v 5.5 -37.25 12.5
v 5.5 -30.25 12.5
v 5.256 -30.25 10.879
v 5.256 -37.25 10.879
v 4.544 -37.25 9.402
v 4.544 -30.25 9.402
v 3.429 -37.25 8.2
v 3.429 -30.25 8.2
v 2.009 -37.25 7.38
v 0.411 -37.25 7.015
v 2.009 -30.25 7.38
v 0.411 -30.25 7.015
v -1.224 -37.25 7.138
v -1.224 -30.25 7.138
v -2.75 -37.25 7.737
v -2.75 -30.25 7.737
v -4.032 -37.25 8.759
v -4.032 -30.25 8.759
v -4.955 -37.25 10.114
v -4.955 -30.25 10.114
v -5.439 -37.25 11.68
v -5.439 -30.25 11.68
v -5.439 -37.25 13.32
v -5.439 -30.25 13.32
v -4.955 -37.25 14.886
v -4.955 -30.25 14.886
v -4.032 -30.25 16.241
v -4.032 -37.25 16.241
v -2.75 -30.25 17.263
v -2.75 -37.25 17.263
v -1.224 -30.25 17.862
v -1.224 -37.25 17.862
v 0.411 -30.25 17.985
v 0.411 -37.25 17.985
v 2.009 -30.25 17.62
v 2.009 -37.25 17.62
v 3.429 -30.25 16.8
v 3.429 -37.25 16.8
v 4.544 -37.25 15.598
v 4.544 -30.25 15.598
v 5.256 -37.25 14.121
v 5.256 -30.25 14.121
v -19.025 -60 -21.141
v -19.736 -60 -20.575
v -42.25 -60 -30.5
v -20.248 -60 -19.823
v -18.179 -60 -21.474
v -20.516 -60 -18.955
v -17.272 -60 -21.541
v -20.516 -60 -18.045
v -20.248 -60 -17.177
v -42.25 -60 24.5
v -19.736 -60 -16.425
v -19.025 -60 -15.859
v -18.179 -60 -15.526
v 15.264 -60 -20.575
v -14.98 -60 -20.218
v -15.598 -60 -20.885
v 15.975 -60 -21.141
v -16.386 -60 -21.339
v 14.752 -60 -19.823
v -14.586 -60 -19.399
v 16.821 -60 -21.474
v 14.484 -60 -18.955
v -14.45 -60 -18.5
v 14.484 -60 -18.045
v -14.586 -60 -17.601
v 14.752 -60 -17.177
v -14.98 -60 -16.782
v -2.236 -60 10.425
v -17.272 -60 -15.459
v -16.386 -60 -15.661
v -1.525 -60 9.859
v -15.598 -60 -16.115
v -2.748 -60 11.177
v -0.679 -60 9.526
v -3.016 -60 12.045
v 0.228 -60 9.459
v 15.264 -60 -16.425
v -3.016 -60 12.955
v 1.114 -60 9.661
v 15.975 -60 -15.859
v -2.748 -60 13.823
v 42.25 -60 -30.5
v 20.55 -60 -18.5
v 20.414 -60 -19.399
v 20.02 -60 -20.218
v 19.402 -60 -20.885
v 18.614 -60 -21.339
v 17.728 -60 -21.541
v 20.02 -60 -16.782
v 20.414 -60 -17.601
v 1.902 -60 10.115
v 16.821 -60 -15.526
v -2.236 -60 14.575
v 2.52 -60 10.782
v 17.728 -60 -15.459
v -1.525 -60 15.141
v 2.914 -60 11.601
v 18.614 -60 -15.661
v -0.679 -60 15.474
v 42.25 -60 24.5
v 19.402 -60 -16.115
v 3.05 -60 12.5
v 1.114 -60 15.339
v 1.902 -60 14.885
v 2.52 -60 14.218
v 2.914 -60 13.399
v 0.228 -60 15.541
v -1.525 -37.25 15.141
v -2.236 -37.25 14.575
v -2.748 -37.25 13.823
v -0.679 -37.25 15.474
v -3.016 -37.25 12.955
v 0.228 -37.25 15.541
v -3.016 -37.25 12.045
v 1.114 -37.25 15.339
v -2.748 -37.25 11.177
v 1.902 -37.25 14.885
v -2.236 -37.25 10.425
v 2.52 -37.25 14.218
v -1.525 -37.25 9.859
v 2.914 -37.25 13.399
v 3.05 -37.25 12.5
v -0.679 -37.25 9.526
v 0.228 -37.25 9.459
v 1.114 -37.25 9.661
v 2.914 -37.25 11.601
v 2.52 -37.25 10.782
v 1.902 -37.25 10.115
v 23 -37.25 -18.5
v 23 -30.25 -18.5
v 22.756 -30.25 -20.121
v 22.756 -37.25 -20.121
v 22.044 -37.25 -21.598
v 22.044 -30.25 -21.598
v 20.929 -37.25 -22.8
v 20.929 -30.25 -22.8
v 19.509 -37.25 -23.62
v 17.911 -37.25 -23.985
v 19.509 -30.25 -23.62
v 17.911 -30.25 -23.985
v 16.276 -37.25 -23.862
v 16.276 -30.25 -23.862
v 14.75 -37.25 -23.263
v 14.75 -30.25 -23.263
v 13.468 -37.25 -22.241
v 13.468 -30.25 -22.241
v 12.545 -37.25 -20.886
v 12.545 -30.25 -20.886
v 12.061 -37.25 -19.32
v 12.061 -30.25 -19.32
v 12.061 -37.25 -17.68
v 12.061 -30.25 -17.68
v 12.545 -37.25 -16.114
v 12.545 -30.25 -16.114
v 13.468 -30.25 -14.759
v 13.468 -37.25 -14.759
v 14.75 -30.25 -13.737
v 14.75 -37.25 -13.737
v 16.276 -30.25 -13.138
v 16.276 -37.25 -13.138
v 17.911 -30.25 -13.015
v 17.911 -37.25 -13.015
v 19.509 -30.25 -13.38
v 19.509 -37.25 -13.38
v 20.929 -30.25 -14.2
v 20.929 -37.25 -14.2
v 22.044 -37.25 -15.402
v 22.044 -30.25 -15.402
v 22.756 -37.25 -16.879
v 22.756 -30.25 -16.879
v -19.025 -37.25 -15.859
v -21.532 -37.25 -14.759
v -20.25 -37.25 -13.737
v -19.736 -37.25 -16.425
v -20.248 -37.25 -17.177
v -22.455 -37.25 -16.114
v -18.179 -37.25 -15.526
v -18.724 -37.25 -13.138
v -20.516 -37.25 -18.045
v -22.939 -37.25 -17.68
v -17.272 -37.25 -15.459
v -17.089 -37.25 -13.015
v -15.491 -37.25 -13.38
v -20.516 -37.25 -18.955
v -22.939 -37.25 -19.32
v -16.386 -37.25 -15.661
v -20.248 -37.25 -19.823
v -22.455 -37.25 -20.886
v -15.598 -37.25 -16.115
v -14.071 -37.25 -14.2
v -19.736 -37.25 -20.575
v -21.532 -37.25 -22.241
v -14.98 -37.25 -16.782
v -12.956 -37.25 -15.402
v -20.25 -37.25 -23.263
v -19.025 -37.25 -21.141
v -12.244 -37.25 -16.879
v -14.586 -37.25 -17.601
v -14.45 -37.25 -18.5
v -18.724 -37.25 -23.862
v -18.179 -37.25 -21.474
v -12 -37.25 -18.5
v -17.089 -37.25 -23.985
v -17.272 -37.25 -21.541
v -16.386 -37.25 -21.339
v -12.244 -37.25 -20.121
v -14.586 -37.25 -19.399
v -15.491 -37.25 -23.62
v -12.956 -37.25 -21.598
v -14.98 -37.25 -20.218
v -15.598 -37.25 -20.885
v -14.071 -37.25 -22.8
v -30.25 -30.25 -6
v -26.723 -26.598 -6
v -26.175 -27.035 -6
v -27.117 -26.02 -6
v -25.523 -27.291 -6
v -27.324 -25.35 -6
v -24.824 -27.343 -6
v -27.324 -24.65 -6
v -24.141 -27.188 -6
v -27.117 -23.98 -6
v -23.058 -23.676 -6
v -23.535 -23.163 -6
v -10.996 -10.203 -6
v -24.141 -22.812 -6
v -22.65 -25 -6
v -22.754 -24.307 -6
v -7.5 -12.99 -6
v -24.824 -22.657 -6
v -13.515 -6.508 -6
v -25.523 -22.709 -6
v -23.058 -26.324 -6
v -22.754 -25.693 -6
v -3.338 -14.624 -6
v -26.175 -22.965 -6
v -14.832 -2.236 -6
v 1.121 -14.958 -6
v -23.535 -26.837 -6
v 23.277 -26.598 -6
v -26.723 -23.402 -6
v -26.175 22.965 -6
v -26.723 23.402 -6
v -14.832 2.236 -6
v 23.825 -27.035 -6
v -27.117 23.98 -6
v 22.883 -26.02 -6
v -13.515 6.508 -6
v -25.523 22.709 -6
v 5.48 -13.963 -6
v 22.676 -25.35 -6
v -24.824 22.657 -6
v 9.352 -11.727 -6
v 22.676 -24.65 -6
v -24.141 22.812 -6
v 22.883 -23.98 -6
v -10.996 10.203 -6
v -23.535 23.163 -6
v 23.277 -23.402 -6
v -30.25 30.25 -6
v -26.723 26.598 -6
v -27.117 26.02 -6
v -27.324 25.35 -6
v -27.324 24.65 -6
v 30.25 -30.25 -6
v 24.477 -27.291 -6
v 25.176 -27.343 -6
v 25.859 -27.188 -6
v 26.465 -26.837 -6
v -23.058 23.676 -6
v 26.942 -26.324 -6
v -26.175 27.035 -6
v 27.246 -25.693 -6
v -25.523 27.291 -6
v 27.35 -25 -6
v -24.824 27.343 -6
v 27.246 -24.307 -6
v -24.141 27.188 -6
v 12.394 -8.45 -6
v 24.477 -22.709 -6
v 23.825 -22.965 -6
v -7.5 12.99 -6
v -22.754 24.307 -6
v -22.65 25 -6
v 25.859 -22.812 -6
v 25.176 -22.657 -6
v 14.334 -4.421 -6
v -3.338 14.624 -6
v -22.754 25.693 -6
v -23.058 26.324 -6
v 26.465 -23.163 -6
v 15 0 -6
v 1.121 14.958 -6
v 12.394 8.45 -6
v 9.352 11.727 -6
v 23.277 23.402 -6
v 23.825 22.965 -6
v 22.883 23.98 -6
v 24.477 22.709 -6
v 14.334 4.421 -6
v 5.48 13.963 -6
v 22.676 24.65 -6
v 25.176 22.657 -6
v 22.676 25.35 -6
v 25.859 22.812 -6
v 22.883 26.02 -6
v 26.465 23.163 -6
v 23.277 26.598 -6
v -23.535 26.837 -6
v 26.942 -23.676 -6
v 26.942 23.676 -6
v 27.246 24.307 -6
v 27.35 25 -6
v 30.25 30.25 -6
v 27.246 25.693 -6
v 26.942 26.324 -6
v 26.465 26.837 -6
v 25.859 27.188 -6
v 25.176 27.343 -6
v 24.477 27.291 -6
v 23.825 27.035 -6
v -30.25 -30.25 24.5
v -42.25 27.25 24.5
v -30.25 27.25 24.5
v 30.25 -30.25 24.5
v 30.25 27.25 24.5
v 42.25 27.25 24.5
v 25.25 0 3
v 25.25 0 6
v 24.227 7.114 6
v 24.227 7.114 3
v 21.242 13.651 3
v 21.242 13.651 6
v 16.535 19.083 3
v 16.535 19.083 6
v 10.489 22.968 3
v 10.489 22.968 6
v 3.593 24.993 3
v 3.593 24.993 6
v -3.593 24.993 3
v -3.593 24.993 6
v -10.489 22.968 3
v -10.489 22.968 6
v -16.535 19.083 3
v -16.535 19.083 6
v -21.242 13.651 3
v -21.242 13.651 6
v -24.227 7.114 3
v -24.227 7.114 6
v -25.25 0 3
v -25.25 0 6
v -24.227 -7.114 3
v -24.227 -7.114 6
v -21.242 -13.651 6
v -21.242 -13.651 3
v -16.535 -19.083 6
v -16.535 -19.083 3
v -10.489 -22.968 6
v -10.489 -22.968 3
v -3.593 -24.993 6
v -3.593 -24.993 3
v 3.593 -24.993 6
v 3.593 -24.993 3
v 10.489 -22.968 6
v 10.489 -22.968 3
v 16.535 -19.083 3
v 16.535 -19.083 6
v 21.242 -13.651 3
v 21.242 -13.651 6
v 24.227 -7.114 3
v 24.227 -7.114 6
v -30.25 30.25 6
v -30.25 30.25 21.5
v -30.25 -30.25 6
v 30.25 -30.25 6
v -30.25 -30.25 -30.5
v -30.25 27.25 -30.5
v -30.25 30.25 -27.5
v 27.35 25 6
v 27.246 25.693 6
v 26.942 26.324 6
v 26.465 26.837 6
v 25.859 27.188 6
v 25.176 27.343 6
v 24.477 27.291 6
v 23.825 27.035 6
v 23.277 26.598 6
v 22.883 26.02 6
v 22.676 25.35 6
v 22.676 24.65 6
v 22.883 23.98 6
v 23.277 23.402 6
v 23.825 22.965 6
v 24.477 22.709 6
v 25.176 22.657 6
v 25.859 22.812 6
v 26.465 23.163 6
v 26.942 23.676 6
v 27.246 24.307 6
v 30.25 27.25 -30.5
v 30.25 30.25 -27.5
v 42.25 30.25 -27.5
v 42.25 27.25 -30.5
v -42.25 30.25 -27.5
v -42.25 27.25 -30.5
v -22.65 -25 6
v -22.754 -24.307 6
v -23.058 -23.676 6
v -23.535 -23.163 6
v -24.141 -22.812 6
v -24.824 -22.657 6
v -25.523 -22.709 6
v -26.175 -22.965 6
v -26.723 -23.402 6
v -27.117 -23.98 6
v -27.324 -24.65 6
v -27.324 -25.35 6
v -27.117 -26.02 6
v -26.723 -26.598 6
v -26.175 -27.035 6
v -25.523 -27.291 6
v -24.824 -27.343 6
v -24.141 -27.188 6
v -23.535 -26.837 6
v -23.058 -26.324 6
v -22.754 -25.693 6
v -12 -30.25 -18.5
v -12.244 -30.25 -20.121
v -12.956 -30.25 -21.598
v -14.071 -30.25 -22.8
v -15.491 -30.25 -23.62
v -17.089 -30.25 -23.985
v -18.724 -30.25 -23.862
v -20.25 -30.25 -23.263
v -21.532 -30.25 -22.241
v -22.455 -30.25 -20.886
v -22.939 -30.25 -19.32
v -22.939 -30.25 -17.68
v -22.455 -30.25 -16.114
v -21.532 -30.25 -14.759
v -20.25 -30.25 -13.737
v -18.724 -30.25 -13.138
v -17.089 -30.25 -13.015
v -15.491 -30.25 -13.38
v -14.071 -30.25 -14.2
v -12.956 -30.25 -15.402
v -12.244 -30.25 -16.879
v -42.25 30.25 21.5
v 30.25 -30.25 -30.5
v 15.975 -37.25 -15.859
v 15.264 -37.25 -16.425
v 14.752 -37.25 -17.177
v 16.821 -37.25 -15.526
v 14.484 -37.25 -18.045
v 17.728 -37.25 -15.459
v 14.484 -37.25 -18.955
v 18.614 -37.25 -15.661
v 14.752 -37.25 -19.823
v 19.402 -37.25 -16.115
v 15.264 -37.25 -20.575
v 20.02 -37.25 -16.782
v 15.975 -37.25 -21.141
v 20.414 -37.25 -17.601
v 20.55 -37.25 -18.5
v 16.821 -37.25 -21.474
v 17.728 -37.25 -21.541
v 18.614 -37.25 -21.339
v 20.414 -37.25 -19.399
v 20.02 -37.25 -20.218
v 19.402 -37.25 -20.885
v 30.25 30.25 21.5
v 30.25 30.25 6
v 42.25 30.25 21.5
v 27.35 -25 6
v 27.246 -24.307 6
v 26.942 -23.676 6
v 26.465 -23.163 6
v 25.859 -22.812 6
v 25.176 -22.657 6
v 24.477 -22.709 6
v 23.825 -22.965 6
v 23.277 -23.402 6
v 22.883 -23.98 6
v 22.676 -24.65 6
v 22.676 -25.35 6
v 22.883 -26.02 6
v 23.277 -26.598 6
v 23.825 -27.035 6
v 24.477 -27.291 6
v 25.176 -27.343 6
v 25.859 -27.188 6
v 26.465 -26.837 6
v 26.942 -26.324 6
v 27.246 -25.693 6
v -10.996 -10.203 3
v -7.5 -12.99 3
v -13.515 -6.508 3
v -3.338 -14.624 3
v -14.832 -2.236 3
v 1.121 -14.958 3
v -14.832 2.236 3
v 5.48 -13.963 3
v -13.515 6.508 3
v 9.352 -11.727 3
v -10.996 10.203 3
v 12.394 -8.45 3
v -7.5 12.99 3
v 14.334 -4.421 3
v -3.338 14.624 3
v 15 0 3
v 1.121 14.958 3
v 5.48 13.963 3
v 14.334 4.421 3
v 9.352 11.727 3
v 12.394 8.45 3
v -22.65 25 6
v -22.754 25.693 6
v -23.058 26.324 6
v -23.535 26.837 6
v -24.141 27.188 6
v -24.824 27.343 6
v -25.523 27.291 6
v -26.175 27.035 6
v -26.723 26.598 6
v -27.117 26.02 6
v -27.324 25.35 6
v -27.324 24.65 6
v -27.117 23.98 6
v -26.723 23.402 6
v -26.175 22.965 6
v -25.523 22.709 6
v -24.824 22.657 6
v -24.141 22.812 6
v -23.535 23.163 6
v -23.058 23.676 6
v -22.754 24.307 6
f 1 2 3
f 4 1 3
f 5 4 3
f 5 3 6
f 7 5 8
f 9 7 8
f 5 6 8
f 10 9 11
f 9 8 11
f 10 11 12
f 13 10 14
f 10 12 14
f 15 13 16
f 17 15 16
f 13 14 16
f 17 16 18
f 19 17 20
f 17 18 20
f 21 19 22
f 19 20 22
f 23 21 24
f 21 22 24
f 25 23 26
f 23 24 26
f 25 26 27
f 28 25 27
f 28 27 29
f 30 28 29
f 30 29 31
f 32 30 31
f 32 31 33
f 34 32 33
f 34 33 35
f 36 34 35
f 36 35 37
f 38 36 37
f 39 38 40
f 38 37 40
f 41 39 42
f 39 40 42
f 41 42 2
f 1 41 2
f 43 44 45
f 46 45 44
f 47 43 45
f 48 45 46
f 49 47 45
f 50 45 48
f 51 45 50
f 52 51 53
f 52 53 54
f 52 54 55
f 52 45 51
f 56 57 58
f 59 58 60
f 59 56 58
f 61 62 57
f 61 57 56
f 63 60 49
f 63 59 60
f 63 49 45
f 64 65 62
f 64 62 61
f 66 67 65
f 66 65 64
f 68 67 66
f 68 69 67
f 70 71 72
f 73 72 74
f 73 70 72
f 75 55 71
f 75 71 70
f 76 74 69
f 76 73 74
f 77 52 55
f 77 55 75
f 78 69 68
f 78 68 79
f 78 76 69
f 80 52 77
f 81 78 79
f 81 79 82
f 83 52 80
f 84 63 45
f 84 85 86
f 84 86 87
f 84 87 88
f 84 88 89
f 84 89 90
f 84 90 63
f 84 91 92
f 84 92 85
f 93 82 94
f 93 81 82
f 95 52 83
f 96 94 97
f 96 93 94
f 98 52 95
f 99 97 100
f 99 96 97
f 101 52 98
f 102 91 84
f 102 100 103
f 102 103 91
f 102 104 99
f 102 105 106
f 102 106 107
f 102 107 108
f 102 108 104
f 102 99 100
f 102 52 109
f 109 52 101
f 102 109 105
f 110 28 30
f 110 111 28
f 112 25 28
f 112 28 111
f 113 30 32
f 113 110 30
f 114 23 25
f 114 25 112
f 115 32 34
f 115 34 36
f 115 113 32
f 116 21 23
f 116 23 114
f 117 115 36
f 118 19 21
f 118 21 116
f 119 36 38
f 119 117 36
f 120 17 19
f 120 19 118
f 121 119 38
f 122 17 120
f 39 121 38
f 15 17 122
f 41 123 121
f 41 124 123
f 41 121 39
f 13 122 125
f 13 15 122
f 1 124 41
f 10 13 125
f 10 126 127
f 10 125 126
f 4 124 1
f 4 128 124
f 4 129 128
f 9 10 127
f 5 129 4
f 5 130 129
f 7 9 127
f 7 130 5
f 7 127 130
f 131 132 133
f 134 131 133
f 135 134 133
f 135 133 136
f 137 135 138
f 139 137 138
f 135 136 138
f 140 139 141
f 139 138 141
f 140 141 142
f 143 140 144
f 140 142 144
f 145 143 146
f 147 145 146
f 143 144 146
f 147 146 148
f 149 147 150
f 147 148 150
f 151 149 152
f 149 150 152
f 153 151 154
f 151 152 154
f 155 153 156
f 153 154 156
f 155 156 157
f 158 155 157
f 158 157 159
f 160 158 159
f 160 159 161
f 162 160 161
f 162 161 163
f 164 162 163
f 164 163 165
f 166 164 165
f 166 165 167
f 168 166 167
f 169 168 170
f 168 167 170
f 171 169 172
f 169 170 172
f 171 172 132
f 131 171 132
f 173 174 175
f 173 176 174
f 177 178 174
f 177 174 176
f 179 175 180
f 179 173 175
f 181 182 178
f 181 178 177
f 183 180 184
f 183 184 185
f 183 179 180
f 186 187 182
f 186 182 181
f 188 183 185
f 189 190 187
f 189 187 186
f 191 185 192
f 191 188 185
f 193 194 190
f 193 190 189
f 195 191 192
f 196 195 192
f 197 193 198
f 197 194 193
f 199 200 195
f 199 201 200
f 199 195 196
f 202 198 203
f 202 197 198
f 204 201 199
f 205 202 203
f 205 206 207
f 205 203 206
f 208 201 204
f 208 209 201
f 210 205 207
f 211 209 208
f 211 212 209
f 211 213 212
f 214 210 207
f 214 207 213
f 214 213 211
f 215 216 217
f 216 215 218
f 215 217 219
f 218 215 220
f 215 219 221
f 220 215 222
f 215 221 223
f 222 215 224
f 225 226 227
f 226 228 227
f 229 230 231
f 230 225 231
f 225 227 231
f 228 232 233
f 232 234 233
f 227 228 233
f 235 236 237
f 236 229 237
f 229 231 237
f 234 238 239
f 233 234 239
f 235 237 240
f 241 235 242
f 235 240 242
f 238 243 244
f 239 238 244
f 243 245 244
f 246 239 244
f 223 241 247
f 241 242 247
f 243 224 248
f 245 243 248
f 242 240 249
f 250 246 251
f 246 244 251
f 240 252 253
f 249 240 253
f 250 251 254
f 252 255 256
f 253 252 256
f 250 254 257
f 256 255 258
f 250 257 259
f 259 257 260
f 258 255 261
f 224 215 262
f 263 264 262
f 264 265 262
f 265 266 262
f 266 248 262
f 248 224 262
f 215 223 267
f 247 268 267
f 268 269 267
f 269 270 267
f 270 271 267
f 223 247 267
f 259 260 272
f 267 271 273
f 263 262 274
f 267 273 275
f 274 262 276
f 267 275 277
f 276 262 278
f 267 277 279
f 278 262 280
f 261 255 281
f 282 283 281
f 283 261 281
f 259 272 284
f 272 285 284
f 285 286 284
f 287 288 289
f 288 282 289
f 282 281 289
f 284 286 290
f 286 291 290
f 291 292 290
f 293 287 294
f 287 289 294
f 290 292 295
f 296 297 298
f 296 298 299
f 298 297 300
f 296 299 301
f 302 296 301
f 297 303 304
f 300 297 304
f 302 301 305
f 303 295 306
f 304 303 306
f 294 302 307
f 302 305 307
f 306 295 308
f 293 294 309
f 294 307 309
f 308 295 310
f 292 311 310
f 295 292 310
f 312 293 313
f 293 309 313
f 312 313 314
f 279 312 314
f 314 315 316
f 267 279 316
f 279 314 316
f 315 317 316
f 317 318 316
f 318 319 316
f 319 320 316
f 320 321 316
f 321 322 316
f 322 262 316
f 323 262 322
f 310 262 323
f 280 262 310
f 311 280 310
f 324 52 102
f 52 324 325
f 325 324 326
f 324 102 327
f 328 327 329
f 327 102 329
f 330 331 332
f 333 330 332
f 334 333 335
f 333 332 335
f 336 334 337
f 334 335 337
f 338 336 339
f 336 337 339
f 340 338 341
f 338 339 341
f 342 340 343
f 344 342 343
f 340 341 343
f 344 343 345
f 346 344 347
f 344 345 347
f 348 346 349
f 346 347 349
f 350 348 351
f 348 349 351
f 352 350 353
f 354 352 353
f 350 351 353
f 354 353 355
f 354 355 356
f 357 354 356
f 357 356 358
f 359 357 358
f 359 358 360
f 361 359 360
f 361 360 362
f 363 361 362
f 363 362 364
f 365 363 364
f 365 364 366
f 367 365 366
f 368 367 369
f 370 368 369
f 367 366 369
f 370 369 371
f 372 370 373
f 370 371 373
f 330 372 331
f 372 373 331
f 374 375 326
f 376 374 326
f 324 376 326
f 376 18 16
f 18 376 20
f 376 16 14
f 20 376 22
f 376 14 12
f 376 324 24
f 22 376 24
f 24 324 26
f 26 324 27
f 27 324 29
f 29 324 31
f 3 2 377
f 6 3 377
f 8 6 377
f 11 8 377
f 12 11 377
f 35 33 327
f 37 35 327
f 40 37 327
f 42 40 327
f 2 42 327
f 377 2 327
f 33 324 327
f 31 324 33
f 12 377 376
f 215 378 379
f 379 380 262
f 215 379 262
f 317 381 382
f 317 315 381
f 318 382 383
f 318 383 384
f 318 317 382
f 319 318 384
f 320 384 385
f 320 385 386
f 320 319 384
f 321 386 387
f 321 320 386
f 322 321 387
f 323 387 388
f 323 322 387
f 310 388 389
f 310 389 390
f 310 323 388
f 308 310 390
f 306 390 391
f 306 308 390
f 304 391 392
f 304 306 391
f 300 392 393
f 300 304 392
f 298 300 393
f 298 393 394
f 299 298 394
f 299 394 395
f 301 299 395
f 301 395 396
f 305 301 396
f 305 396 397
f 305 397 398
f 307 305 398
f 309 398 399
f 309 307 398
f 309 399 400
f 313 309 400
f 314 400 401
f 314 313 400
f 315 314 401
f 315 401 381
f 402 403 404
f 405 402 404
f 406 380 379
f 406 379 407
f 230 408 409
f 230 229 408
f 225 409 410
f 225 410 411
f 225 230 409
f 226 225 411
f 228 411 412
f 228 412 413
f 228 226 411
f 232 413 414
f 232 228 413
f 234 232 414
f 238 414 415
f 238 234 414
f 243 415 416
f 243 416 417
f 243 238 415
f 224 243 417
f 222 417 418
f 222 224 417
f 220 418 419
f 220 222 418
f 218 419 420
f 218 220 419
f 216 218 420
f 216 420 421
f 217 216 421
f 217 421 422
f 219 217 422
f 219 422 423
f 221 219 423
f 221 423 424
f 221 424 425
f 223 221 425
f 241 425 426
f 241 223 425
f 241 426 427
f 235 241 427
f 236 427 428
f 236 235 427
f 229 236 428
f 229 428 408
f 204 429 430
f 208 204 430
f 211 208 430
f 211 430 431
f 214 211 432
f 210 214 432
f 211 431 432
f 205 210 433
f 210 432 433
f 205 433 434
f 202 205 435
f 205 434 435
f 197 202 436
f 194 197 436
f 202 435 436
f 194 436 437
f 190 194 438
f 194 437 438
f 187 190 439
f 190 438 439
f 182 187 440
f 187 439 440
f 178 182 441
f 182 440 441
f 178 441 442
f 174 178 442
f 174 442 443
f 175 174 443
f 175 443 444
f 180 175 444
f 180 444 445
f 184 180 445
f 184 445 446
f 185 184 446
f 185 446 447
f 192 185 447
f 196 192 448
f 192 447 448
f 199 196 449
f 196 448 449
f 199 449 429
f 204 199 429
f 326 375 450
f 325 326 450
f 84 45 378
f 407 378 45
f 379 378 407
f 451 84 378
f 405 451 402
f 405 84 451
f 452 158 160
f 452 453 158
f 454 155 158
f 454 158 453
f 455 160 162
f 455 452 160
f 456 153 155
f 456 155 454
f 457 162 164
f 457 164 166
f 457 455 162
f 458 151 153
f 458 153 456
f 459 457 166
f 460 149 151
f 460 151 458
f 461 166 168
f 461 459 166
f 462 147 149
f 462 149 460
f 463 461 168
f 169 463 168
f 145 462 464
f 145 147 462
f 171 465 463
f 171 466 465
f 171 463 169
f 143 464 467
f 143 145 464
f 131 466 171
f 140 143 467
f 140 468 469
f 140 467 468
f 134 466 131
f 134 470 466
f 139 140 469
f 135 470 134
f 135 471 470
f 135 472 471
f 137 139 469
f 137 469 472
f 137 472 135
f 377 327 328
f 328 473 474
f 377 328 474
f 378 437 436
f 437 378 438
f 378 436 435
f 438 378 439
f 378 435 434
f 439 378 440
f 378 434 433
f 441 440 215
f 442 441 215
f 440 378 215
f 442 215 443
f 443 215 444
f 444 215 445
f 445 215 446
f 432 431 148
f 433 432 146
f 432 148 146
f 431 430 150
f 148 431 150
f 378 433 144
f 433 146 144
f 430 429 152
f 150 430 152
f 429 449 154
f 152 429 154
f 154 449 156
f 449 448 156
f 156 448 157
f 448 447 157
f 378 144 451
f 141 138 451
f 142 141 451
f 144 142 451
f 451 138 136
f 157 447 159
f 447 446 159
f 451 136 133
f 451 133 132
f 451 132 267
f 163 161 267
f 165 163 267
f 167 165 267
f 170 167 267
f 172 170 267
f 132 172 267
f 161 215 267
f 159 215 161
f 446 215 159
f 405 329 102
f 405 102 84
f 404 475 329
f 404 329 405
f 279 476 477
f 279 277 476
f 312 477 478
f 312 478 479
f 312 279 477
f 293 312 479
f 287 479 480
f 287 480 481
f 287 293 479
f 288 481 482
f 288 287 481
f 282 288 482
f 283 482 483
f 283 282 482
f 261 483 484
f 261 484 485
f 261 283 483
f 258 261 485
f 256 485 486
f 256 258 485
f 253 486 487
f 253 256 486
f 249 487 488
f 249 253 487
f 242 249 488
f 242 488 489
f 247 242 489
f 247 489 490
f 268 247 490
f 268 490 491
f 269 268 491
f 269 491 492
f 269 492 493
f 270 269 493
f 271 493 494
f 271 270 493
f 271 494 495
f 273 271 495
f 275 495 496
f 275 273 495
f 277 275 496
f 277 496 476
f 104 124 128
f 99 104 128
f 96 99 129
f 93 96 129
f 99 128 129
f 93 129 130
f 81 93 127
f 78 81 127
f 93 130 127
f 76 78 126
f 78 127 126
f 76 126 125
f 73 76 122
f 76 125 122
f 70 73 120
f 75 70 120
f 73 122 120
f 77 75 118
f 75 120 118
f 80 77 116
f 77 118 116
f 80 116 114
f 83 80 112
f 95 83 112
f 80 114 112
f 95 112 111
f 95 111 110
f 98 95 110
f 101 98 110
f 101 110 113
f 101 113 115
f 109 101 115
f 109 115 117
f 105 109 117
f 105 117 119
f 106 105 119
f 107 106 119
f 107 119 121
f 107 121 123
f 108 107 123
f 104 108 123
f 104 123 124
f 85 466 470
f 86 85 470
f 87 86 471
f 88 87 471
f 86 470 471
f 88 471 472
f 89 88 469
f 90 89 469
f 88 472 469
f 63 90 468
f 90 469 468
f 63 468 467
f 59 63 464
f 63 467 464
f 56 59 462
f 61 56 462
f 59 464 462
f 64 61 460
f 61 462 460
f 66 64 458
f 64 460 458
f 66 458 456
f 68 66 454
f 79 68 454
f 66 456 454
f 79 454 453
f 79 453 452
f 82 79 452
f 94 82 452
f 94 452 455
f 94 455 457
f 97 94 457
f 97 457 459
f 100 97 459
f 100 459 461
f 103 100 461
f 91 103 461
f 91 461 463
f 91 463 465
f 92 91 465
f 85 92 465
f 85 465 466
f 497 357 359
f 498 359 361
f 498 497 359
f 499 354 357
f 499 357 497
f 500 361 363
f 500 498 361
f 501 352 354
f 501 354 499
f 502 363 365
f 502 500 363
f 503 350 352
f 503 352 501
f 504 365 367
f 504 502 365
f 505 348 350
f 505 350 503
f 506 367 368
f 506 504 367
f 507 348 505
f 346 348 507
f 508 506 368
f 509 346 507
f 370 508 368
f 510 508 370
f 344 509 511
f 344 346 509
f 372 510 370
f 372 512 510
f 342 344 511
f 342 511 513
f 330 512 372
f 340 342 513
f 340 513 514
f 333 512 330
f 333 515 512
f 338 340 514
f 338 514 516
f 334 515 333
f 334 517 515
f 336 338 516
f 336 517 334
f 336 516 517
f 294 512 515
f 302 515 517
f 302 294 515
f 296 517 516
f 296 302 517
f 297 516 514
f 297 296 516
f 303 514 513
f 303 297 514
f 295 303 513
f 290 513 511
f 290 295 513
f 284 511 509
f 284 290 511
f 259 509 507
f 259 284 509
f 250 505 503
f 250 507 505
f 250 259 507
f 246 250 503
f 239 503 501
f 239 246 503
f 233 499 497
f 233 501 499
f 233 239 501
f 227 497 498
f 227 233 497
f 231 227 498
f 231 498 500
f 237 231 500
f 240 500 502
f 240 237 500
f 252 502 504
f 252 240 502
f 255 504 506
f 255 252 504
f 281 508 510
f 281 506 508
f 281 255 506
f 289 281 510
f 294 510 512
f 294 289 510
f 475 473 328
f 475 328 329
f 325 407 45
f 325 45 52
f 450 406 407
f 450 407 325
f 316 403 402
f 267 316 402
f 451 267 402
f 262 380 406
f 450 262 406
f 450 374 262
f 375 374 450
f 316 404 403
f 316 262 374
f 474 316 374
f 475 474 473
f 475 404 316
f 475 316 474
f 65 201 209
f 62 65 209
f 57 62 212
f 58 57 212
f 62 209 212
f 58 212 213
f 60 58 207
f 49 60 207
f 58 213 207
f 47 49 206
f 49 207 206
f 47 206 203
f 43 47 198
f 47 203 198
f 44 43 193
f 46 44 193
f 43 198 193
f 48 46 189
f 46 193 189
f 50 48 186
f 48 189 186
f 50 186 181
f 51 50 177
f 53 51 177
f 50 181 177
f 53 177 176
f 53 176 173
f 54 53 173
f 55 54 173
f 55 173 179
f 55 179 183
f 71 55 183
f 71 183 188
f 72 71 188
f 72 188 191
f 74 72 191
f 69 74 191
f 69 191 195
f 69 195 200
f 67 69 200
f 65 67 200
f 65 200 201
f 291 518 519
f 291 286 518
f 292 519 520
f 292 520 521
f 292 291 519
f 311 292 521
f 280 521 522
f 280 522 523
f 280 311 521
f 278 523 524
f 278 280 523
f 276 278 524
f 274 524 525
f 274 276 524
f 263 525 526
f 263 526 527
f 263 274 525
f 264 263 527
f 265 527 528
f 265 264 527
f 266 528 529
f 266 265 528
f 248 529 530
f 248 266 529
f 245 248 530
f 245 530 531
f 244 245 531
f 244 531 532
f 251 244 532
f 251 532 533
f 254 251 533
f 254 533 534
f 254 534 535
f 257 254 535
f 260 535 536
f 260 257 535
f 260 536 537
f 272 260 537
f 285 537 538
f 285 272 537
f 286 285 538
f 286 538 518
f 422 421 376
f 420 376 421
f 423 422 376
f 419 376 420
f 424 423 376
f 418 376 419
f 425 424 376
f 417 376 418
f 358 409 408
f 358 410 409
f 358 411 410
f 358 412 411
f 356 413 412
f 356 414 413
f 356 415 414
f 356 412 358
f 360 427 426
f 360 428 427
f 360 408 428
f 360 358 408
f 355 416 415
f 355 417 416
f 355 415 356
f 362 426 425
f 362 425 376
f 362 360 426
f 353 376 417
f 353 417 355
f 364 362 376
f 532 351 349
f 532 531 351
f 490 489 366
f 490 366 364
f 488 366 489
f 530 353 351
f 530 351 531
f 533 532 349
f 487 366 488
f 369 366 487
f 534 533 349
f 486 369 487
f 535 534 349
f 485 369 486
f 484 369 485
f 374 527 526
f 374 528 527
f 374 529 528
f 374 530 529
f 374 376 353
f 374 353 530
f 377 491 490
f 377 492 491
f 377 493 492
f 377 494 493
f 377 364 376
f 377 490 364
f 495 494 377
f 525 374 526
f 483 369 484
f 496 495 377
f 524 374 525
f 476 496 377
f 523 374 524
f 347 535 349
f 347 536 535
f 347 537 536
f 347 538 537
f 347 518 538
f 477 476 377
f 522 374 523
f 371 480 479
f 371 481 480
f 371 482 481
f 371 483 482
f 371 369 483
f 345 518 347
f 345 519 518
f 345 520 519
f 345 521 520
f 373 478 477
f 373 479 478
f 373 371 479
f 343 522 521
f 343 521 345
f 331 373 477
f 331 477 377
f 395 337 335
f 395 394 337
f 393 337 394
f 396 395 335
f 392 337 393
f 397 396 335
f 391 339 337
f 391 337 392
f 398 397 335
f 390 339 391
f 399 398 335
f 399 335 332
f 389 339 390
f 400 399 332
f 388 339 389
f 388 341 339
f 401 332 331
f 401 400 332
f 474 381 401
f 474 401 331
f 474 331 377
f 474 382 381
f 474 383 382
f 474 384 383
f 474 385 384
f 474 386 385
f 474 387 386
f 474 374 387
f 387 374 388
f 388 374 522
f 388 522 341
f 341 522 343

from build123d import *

# Parameters (mm, degrees)
SKETCH1_W           = 60.5
SKETCH1_H           = 60.5
SKETCH1_R           = 15
SKETCH1_R_2         = 2.35
BOSS_EXTRUDE1_DEPTH = 6
SKETCH2_R           = 25.25
CUT_EXTRUDE1_DEPTH  = 3
SKETCH3_W           = 84.5
SKETCH3_H           = 55
BOSS_EXTRUDE2_DEPTH = 29.75
SKETCH4_W           = 55
SKETCH4_H           = 60.5
BOSS_EXTRUDE3_DEPTH = 12
SKETCH5_W           = 55
SKETCH5_H           = 60.5
BOSS_EXTRUDE4_DEPTH = 12
CHAMFER1_SIZE       = 3
SKETCH6_R           = 3.05
CUT_EXTRUDE2_DEPTH  = 30.75
SKETCH7_R           = 5.5
CUT_EXTRUDE3_DEPTH  = 7


with BuildPart() as part:
    # Sketch1 → Boss-Extrude1 (new body, symmetric)
    with BuildSketch(Plane.XY):
        Rectangle(SKETCH1_W, SKETCH1_H)
        Circle(SKETCH1_R, mode=Mode.SUBTRACT)
        with Locations((-25, 25)):
            Circle(SKETCH1_R_2, mode=Mode.SUBTRACT)
        with Locations((25, 25)):
            Circle(SKETCH1_R_2, mode=Mode.SUBTRACT)
        with Locations((25, -25)):
            Circle(SKETCH1_R_2, mode=Mode.SUBTRACT)
        with Locations((-25, -25)):
            Circle(SKETCH1_R_2, mode=Mode.SUBTRACT)
    extrude(amount=BOSS_EXTRUDE1_DEPTH, both=True)

    # Sketch2 → Cut-Extrude1 (cut)
    with BuildSketch(Plane.XY.offset(6)):
        Circle(SKETCH2_R)
    extrude(amount=-CUT_EXTRUDE1_DEPTH, mode=Mode.SUBTRACT)

    # Sketch3 → Boss-Extrude2 (add)
    with BuildSketch(Plane.XZ.offset(30.25)):
        with Locations((0, -3)):
            Rectangle(SKETCH3_W, SKETCH3_H)
    extrude(amount=BOSS_EXTRUDE2_DEPTH)

    # Sketch4 → Boss-Extrude3 (add)
    with BuildSketch(Plane(origin=(30.25, 0, 0), x_dir=(0, 0, -1), z_dir=(1, 0, 0))):
        with Locations((3, 0)):
            Rectangle(SKETCH4_W, SKETCH4_H)
    extrude(amount=BOSS_EXTRUDE3_DEPTH)

    # Sketch5 → Boss-Extrude4 (add)
    with BuildSketch(Plane.ZY.offset(30.25)):
        with Locations((-3, 0)):
            Rectangle(SKETCH5_W, SKETCH5_H)
    extrude(amount=BOSS_EXTRUDE4_DEPTH)

    # Chamfer1
    chamfer1_edges = [part.edges().sort_by_distance(p)[0] for p in [
        (36.25, 30.25, 24.5),
        (36.25, 30.25, -30.5),
        (-36.25, 30.25, -30.5),
        (-36.25, 30.25, 24.5),
    ]]
    chamfer(chamfer1_edges, length=CHAMFER1_SIZE)

    # Sketch6 → Cut-Extrude2 (cut, through all)
    with BuildSketch(Plane(origin=(0, -30.25, 0), x_dir=(1, 0, 0), z_dir=(0, 1, 0))):
        with Locations((0, -12.5)):
            Circle(SKETCH6_R)
        with Locations((-17.5, 18.5)):
            Circle(SKETCH6_R)
        with Locations((17.5, 18.5)):
            Circle(SKETCH6_R)
    extrude(amount=-CUT_EXTRUDE2_DEPTH, mode=Mode.SUBTRACT)

    # Sketch7 → Cut-Extrude3 (cut)
    with BuildSketch(Plane(origin=(0, -30.25, 0), x_dir=(1, 0, 0), z_dir=(0, 1, 0))):
        with Locations((-17.5, 18.5)):
            Circle(SKETCH7_R)
        with Locations((17.5, 18.5)):
            Circle(SKETCH7_R)
        with Locations((0, -12.5)):
            Circle(SKETCH7_R)
    extrude(amount=-CUT_EXTRUDE3_DEPTH, mode=Mode.SUBTRACT)


solid = part.part
